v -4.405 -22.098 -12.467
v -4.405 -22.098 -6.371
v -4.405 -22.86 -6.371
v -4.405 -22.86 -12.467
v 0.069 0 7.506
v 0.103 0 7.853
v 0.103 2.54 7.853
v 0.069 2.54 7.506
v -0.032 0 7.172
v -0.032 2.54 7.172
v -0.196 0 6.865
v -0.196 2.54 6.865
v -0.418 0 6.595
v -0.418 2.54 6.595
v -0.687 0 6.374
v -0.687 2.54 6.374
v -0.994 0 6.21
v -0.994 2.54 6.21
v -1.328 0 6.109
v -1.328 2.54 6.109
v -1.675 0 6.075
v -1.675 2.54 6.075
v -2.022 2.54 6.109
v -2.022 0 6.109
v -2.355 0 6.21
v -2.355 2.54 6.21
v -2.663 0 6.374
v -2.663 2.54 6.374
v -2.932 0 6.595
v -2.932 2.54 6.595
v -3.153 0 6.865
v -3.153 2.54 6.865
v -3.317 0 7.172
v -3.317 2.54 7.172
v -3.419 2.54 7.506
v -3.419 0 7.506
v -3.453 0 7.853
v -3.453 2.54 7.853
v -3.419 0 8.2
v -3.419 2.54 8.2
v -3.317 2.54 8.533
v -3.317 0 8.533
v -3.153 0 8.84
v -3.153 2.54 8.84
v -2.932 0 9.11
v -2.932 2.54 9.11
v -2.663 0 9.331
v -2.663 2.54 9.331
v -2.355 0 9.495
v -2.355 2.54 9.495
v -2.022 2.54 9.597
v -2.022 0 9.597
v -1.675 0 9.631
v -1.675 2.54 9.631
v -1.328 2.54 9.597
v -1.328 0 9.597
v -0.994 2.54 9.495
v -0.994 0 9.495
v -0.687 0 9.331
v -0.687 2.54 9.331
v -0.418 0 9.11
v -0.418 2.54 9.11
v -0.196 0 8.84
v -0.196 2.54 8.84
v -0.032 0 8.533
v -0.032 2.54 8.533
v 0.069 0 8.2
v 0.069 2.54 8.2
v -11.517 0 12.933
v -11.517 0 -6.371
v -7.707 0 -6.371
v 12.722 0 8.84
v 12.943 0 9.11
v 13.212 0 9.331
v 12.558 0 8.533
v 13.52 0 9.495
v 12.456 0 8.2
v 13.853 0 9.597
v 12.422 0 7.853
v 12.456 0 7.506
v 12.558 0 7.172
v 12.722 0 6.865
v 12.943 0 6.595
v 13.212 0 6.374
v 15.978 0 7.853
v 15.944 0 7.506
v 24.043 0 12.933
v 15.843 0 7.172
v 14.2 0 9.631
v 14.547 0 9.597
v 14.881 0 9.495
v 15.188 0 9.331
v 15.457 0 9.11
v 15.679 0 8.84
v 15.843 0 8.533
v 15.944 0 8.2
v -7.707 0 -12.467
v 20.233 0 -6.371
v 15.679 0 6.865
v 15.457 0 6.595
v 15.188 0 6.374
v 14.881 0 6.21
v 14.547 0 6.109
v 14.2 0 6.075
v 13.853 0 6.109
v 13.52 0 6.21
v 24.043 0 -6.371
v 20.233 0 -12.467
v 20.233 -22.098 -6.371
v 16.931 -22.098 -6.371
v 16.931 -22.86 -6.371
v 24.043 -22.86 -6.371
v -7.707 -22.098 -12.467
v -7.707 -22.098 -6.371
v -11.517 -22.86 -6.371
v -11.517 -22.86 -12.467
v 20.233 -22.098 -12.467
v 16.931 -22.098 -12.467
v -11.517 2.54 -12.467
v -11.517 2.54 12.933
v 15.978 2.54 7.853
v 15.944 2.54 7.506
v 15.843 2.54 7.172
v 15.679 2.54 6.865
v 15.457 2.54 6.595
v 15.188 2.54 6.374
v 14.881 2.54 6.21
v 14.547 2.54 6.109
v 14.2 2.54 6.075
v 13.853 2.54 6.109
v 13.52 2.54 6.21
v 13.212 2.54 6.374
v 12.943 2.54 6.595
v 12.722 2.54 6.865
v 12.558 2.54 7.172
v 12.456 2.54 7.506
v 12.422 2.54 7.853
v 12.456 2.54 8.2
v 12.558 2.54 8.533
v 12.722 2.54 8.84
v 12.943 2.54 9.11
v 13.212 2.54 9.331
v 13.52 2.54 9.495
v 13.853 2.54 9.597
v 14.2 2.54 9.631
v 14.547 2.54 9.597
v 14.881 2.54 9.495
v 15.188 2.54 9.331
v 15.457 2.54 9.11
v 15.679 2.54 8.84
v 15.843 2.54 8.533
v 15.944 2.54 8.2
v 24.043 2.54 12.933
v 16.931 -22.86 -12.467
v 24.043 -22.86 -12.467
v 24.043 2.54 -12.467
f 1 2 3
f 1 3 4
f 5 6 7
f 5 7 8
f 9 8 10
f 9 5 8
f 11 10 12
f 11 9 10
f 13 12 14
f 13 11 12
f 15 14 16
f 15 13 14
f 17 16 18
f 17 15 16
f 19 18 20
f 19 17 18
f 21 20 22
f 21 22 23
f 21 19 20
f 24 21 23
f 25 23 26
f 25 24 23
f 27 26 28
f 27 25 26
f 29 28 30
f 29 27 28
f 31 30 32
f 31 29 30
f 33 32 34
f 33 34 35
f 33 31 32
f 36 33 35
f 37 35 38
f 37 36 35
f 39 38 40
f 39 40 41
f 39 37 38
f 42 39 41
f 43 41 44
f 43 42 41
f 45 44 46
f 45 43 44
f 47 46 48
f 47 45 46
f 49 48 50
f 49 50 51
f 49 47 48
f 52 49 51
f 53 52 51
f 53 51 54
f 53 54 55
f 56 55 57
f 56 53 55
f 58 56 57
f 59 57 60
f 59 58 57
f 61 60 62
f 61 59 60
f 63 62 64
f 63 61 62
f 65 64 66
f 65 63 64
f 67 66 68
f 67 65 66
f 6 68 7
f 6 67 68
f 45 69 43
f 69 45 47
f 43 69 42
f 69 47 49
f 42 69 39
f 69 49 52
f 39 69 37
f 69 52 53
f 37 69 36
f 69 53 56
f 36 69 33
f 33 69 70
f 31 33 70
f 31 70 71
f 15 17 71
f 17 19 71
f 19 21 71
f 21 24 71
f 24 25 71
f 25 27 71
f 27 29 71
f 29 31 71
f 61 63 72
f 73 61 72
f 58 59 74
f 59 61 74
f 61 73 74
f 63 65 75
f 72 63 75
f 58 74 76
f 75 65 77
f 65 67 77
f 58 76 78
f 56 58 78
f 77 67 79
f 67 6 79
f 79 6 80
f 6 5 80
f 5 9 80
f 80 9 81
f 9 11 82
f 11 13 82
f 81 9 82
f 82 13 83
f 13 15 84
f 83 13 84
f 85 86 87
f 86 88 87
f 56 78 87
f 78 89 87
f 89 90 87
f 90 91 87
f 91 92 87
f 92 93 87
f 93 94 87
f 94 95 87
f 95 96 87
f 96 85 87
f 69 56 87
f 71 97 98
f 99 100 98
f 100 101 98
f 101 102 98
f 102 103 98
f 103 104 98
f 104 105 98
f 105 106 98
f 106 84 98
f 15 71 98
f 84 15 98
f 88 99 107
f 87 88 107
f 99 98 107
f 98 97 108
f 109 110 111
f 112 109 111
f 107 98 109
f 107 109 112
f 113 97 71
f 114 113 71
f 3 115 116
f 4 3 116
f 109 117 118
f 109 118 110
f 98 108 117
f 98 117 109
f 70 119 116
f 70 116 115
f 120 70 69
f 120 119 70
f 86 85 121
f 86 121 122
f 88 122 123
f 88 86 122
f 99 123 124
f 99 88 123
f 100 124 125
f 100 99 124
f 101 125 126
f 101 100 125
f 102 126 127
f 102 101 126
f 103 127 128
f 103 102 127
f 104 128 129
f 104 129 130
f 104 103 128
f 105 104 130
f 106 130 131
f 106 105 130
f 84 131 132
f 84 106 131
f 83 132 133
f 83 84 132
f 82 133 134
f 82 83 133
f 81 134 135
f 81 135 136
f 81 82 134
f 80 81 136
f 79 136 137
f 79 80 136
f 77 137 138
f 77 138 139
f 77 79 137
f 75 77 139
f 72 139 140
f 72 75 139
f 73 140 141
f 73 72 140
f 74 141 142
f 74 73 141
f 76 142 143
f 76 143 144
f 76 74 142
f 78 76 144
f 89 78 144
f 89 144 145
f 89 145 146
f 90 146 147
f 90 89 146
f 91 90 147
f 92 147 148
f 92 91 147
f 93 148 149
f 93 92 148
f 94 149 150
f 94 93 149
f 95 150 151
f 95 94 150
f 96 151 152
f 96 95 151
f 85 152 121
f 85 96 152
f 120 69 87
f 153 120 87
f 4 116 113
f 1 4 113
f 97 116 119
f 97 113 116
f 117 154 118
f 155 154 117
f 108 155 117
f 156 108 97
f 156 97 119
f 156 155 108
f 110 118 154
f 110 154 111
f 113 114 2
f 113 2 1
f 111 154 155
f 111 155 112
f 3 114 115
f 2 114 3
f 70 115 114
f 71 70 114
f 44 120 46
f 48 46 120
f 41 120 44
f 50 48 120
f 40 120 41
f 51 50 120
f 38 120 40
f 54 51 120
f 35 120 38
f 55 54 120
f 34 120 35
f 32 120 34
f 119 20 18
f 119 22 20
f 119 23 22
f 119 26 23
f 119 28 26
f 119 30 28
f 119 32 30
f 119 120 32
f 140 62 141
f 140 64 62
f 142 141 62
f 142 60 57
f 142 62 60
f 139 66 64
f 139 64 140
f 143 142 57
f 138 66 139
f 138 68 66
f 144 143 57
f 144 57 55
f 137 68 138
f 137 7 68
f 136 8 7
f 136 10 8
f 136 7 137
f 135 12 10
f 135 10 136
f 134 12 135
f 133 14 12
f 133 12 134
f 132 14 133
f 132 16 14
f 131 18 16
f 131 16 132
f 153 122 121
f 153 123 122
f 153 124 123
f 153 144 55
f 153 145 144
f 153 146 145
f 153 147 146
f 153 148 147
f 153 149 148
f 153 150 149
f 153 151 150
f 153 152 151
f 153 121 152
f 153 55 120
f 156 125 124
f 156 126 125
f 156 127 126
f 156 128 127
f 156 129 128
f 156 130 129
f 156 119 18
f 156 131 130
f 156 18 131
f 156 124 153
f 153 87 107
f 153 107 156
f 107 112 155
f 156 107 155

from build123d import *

# Parameters (mm, degrees)
SKETCH3_W           = 35.56
SKETCH3_H           = 25.4
SKETCH3_R           = 1.778
BOSS_EXTRUDE3_DEPTH = 2.54
SKETCH4_W           = 3.81
SKETCH4_H           = 11.176
BOSS_EXTRUDE4_DEPTH = 22.86
SKETCH5_W           = 11.176
SKETCH5_H           = 0.762
BOSS_EXTRUDE5_DEPTH = 3.302
SKETCH6_W           = 11.176
SKETCH6_H           = 0.762
BOSS_EXTRUDE6_DEPTH = 3.302
SKETCH7_W           = 35.56
SKETCH7_H           = 22.86
CUT_EXTRUDE1_DEPTH  = 5.08


with BuildPart() as part:
    # Sketch3 → Boss-Extrude3 (new body)
    with BuildSketch(Plane(origin=(0, 0, 0), x_dir=(1, 0, 0), z_dir=(0, 1, 0))):
        with Locations((6.262748092, -0.232671756)):
            Rectangle(SKETCH3_W, SKETCH3_H)
        with Locations((-1.674751908, -7.852671756)):
            Circle(SKETCH3_R, mode=Mode.SUBTRACT)
        with Locations((14.200248092, -7.852671756)):
            Circle(SKETCH3_R, mode=Mode.SUBTRACT)
    extrude(amount=BOSS_EXTRUDE3_DEPTH)

    # Sketch4 → Boss-Extrude4 (add)
    with BuildSketch(Plane.XZ):
        with Locations((-9.612251908, -6.879328244)):
            Rectangle(SKETCH4_W, SKETCH4_H)
        with Locations((22.137748092, -6.879328244)):
            Rectangle(SKETCH4_W, SKETCH4_H)
    extrude(amount=BOSS_EXTRUDE4_DEPTH)

    # Sketch5 → Boss-Extrude5 (add)
    with BuildSketch(Plane(origin=(-7.707251908, 0, 0), x_dir=(0, 0, -1), z_dir=(1, 0, 0))):
        with Locations((6.879328244, -22.479)):
            Rectangle(SKETCH5_W, SKETCH5_H)
    extrude(amount=BOSS_EXTRUDE5_DEPTH)

    # Sketch6 → Boss-Extrude6 (add)
    with BuildSketch(Plane.ZY.offset(-20.232748092)):
        with Locations((-6.879328244, -22.479)):
            Rectangle(SKETCH6_W, SKETCH6_H)
    extrude(amount=BOSS_EXTRUDE6_DEPTH)

    # Sketch7 → Cut-Extrude1 (cut)
    with BuildSketch(Plane.XY.offset(-1.291328244)):
        with Locations((6.262748092, -11.43)):
            Rectangle(SKETCH7_W, SKETCH7_H)
    extrude(amount=-CUT_EXTRUDE1_DEPTH, mode=Mode.SUBTRACT)


solid = part.part
